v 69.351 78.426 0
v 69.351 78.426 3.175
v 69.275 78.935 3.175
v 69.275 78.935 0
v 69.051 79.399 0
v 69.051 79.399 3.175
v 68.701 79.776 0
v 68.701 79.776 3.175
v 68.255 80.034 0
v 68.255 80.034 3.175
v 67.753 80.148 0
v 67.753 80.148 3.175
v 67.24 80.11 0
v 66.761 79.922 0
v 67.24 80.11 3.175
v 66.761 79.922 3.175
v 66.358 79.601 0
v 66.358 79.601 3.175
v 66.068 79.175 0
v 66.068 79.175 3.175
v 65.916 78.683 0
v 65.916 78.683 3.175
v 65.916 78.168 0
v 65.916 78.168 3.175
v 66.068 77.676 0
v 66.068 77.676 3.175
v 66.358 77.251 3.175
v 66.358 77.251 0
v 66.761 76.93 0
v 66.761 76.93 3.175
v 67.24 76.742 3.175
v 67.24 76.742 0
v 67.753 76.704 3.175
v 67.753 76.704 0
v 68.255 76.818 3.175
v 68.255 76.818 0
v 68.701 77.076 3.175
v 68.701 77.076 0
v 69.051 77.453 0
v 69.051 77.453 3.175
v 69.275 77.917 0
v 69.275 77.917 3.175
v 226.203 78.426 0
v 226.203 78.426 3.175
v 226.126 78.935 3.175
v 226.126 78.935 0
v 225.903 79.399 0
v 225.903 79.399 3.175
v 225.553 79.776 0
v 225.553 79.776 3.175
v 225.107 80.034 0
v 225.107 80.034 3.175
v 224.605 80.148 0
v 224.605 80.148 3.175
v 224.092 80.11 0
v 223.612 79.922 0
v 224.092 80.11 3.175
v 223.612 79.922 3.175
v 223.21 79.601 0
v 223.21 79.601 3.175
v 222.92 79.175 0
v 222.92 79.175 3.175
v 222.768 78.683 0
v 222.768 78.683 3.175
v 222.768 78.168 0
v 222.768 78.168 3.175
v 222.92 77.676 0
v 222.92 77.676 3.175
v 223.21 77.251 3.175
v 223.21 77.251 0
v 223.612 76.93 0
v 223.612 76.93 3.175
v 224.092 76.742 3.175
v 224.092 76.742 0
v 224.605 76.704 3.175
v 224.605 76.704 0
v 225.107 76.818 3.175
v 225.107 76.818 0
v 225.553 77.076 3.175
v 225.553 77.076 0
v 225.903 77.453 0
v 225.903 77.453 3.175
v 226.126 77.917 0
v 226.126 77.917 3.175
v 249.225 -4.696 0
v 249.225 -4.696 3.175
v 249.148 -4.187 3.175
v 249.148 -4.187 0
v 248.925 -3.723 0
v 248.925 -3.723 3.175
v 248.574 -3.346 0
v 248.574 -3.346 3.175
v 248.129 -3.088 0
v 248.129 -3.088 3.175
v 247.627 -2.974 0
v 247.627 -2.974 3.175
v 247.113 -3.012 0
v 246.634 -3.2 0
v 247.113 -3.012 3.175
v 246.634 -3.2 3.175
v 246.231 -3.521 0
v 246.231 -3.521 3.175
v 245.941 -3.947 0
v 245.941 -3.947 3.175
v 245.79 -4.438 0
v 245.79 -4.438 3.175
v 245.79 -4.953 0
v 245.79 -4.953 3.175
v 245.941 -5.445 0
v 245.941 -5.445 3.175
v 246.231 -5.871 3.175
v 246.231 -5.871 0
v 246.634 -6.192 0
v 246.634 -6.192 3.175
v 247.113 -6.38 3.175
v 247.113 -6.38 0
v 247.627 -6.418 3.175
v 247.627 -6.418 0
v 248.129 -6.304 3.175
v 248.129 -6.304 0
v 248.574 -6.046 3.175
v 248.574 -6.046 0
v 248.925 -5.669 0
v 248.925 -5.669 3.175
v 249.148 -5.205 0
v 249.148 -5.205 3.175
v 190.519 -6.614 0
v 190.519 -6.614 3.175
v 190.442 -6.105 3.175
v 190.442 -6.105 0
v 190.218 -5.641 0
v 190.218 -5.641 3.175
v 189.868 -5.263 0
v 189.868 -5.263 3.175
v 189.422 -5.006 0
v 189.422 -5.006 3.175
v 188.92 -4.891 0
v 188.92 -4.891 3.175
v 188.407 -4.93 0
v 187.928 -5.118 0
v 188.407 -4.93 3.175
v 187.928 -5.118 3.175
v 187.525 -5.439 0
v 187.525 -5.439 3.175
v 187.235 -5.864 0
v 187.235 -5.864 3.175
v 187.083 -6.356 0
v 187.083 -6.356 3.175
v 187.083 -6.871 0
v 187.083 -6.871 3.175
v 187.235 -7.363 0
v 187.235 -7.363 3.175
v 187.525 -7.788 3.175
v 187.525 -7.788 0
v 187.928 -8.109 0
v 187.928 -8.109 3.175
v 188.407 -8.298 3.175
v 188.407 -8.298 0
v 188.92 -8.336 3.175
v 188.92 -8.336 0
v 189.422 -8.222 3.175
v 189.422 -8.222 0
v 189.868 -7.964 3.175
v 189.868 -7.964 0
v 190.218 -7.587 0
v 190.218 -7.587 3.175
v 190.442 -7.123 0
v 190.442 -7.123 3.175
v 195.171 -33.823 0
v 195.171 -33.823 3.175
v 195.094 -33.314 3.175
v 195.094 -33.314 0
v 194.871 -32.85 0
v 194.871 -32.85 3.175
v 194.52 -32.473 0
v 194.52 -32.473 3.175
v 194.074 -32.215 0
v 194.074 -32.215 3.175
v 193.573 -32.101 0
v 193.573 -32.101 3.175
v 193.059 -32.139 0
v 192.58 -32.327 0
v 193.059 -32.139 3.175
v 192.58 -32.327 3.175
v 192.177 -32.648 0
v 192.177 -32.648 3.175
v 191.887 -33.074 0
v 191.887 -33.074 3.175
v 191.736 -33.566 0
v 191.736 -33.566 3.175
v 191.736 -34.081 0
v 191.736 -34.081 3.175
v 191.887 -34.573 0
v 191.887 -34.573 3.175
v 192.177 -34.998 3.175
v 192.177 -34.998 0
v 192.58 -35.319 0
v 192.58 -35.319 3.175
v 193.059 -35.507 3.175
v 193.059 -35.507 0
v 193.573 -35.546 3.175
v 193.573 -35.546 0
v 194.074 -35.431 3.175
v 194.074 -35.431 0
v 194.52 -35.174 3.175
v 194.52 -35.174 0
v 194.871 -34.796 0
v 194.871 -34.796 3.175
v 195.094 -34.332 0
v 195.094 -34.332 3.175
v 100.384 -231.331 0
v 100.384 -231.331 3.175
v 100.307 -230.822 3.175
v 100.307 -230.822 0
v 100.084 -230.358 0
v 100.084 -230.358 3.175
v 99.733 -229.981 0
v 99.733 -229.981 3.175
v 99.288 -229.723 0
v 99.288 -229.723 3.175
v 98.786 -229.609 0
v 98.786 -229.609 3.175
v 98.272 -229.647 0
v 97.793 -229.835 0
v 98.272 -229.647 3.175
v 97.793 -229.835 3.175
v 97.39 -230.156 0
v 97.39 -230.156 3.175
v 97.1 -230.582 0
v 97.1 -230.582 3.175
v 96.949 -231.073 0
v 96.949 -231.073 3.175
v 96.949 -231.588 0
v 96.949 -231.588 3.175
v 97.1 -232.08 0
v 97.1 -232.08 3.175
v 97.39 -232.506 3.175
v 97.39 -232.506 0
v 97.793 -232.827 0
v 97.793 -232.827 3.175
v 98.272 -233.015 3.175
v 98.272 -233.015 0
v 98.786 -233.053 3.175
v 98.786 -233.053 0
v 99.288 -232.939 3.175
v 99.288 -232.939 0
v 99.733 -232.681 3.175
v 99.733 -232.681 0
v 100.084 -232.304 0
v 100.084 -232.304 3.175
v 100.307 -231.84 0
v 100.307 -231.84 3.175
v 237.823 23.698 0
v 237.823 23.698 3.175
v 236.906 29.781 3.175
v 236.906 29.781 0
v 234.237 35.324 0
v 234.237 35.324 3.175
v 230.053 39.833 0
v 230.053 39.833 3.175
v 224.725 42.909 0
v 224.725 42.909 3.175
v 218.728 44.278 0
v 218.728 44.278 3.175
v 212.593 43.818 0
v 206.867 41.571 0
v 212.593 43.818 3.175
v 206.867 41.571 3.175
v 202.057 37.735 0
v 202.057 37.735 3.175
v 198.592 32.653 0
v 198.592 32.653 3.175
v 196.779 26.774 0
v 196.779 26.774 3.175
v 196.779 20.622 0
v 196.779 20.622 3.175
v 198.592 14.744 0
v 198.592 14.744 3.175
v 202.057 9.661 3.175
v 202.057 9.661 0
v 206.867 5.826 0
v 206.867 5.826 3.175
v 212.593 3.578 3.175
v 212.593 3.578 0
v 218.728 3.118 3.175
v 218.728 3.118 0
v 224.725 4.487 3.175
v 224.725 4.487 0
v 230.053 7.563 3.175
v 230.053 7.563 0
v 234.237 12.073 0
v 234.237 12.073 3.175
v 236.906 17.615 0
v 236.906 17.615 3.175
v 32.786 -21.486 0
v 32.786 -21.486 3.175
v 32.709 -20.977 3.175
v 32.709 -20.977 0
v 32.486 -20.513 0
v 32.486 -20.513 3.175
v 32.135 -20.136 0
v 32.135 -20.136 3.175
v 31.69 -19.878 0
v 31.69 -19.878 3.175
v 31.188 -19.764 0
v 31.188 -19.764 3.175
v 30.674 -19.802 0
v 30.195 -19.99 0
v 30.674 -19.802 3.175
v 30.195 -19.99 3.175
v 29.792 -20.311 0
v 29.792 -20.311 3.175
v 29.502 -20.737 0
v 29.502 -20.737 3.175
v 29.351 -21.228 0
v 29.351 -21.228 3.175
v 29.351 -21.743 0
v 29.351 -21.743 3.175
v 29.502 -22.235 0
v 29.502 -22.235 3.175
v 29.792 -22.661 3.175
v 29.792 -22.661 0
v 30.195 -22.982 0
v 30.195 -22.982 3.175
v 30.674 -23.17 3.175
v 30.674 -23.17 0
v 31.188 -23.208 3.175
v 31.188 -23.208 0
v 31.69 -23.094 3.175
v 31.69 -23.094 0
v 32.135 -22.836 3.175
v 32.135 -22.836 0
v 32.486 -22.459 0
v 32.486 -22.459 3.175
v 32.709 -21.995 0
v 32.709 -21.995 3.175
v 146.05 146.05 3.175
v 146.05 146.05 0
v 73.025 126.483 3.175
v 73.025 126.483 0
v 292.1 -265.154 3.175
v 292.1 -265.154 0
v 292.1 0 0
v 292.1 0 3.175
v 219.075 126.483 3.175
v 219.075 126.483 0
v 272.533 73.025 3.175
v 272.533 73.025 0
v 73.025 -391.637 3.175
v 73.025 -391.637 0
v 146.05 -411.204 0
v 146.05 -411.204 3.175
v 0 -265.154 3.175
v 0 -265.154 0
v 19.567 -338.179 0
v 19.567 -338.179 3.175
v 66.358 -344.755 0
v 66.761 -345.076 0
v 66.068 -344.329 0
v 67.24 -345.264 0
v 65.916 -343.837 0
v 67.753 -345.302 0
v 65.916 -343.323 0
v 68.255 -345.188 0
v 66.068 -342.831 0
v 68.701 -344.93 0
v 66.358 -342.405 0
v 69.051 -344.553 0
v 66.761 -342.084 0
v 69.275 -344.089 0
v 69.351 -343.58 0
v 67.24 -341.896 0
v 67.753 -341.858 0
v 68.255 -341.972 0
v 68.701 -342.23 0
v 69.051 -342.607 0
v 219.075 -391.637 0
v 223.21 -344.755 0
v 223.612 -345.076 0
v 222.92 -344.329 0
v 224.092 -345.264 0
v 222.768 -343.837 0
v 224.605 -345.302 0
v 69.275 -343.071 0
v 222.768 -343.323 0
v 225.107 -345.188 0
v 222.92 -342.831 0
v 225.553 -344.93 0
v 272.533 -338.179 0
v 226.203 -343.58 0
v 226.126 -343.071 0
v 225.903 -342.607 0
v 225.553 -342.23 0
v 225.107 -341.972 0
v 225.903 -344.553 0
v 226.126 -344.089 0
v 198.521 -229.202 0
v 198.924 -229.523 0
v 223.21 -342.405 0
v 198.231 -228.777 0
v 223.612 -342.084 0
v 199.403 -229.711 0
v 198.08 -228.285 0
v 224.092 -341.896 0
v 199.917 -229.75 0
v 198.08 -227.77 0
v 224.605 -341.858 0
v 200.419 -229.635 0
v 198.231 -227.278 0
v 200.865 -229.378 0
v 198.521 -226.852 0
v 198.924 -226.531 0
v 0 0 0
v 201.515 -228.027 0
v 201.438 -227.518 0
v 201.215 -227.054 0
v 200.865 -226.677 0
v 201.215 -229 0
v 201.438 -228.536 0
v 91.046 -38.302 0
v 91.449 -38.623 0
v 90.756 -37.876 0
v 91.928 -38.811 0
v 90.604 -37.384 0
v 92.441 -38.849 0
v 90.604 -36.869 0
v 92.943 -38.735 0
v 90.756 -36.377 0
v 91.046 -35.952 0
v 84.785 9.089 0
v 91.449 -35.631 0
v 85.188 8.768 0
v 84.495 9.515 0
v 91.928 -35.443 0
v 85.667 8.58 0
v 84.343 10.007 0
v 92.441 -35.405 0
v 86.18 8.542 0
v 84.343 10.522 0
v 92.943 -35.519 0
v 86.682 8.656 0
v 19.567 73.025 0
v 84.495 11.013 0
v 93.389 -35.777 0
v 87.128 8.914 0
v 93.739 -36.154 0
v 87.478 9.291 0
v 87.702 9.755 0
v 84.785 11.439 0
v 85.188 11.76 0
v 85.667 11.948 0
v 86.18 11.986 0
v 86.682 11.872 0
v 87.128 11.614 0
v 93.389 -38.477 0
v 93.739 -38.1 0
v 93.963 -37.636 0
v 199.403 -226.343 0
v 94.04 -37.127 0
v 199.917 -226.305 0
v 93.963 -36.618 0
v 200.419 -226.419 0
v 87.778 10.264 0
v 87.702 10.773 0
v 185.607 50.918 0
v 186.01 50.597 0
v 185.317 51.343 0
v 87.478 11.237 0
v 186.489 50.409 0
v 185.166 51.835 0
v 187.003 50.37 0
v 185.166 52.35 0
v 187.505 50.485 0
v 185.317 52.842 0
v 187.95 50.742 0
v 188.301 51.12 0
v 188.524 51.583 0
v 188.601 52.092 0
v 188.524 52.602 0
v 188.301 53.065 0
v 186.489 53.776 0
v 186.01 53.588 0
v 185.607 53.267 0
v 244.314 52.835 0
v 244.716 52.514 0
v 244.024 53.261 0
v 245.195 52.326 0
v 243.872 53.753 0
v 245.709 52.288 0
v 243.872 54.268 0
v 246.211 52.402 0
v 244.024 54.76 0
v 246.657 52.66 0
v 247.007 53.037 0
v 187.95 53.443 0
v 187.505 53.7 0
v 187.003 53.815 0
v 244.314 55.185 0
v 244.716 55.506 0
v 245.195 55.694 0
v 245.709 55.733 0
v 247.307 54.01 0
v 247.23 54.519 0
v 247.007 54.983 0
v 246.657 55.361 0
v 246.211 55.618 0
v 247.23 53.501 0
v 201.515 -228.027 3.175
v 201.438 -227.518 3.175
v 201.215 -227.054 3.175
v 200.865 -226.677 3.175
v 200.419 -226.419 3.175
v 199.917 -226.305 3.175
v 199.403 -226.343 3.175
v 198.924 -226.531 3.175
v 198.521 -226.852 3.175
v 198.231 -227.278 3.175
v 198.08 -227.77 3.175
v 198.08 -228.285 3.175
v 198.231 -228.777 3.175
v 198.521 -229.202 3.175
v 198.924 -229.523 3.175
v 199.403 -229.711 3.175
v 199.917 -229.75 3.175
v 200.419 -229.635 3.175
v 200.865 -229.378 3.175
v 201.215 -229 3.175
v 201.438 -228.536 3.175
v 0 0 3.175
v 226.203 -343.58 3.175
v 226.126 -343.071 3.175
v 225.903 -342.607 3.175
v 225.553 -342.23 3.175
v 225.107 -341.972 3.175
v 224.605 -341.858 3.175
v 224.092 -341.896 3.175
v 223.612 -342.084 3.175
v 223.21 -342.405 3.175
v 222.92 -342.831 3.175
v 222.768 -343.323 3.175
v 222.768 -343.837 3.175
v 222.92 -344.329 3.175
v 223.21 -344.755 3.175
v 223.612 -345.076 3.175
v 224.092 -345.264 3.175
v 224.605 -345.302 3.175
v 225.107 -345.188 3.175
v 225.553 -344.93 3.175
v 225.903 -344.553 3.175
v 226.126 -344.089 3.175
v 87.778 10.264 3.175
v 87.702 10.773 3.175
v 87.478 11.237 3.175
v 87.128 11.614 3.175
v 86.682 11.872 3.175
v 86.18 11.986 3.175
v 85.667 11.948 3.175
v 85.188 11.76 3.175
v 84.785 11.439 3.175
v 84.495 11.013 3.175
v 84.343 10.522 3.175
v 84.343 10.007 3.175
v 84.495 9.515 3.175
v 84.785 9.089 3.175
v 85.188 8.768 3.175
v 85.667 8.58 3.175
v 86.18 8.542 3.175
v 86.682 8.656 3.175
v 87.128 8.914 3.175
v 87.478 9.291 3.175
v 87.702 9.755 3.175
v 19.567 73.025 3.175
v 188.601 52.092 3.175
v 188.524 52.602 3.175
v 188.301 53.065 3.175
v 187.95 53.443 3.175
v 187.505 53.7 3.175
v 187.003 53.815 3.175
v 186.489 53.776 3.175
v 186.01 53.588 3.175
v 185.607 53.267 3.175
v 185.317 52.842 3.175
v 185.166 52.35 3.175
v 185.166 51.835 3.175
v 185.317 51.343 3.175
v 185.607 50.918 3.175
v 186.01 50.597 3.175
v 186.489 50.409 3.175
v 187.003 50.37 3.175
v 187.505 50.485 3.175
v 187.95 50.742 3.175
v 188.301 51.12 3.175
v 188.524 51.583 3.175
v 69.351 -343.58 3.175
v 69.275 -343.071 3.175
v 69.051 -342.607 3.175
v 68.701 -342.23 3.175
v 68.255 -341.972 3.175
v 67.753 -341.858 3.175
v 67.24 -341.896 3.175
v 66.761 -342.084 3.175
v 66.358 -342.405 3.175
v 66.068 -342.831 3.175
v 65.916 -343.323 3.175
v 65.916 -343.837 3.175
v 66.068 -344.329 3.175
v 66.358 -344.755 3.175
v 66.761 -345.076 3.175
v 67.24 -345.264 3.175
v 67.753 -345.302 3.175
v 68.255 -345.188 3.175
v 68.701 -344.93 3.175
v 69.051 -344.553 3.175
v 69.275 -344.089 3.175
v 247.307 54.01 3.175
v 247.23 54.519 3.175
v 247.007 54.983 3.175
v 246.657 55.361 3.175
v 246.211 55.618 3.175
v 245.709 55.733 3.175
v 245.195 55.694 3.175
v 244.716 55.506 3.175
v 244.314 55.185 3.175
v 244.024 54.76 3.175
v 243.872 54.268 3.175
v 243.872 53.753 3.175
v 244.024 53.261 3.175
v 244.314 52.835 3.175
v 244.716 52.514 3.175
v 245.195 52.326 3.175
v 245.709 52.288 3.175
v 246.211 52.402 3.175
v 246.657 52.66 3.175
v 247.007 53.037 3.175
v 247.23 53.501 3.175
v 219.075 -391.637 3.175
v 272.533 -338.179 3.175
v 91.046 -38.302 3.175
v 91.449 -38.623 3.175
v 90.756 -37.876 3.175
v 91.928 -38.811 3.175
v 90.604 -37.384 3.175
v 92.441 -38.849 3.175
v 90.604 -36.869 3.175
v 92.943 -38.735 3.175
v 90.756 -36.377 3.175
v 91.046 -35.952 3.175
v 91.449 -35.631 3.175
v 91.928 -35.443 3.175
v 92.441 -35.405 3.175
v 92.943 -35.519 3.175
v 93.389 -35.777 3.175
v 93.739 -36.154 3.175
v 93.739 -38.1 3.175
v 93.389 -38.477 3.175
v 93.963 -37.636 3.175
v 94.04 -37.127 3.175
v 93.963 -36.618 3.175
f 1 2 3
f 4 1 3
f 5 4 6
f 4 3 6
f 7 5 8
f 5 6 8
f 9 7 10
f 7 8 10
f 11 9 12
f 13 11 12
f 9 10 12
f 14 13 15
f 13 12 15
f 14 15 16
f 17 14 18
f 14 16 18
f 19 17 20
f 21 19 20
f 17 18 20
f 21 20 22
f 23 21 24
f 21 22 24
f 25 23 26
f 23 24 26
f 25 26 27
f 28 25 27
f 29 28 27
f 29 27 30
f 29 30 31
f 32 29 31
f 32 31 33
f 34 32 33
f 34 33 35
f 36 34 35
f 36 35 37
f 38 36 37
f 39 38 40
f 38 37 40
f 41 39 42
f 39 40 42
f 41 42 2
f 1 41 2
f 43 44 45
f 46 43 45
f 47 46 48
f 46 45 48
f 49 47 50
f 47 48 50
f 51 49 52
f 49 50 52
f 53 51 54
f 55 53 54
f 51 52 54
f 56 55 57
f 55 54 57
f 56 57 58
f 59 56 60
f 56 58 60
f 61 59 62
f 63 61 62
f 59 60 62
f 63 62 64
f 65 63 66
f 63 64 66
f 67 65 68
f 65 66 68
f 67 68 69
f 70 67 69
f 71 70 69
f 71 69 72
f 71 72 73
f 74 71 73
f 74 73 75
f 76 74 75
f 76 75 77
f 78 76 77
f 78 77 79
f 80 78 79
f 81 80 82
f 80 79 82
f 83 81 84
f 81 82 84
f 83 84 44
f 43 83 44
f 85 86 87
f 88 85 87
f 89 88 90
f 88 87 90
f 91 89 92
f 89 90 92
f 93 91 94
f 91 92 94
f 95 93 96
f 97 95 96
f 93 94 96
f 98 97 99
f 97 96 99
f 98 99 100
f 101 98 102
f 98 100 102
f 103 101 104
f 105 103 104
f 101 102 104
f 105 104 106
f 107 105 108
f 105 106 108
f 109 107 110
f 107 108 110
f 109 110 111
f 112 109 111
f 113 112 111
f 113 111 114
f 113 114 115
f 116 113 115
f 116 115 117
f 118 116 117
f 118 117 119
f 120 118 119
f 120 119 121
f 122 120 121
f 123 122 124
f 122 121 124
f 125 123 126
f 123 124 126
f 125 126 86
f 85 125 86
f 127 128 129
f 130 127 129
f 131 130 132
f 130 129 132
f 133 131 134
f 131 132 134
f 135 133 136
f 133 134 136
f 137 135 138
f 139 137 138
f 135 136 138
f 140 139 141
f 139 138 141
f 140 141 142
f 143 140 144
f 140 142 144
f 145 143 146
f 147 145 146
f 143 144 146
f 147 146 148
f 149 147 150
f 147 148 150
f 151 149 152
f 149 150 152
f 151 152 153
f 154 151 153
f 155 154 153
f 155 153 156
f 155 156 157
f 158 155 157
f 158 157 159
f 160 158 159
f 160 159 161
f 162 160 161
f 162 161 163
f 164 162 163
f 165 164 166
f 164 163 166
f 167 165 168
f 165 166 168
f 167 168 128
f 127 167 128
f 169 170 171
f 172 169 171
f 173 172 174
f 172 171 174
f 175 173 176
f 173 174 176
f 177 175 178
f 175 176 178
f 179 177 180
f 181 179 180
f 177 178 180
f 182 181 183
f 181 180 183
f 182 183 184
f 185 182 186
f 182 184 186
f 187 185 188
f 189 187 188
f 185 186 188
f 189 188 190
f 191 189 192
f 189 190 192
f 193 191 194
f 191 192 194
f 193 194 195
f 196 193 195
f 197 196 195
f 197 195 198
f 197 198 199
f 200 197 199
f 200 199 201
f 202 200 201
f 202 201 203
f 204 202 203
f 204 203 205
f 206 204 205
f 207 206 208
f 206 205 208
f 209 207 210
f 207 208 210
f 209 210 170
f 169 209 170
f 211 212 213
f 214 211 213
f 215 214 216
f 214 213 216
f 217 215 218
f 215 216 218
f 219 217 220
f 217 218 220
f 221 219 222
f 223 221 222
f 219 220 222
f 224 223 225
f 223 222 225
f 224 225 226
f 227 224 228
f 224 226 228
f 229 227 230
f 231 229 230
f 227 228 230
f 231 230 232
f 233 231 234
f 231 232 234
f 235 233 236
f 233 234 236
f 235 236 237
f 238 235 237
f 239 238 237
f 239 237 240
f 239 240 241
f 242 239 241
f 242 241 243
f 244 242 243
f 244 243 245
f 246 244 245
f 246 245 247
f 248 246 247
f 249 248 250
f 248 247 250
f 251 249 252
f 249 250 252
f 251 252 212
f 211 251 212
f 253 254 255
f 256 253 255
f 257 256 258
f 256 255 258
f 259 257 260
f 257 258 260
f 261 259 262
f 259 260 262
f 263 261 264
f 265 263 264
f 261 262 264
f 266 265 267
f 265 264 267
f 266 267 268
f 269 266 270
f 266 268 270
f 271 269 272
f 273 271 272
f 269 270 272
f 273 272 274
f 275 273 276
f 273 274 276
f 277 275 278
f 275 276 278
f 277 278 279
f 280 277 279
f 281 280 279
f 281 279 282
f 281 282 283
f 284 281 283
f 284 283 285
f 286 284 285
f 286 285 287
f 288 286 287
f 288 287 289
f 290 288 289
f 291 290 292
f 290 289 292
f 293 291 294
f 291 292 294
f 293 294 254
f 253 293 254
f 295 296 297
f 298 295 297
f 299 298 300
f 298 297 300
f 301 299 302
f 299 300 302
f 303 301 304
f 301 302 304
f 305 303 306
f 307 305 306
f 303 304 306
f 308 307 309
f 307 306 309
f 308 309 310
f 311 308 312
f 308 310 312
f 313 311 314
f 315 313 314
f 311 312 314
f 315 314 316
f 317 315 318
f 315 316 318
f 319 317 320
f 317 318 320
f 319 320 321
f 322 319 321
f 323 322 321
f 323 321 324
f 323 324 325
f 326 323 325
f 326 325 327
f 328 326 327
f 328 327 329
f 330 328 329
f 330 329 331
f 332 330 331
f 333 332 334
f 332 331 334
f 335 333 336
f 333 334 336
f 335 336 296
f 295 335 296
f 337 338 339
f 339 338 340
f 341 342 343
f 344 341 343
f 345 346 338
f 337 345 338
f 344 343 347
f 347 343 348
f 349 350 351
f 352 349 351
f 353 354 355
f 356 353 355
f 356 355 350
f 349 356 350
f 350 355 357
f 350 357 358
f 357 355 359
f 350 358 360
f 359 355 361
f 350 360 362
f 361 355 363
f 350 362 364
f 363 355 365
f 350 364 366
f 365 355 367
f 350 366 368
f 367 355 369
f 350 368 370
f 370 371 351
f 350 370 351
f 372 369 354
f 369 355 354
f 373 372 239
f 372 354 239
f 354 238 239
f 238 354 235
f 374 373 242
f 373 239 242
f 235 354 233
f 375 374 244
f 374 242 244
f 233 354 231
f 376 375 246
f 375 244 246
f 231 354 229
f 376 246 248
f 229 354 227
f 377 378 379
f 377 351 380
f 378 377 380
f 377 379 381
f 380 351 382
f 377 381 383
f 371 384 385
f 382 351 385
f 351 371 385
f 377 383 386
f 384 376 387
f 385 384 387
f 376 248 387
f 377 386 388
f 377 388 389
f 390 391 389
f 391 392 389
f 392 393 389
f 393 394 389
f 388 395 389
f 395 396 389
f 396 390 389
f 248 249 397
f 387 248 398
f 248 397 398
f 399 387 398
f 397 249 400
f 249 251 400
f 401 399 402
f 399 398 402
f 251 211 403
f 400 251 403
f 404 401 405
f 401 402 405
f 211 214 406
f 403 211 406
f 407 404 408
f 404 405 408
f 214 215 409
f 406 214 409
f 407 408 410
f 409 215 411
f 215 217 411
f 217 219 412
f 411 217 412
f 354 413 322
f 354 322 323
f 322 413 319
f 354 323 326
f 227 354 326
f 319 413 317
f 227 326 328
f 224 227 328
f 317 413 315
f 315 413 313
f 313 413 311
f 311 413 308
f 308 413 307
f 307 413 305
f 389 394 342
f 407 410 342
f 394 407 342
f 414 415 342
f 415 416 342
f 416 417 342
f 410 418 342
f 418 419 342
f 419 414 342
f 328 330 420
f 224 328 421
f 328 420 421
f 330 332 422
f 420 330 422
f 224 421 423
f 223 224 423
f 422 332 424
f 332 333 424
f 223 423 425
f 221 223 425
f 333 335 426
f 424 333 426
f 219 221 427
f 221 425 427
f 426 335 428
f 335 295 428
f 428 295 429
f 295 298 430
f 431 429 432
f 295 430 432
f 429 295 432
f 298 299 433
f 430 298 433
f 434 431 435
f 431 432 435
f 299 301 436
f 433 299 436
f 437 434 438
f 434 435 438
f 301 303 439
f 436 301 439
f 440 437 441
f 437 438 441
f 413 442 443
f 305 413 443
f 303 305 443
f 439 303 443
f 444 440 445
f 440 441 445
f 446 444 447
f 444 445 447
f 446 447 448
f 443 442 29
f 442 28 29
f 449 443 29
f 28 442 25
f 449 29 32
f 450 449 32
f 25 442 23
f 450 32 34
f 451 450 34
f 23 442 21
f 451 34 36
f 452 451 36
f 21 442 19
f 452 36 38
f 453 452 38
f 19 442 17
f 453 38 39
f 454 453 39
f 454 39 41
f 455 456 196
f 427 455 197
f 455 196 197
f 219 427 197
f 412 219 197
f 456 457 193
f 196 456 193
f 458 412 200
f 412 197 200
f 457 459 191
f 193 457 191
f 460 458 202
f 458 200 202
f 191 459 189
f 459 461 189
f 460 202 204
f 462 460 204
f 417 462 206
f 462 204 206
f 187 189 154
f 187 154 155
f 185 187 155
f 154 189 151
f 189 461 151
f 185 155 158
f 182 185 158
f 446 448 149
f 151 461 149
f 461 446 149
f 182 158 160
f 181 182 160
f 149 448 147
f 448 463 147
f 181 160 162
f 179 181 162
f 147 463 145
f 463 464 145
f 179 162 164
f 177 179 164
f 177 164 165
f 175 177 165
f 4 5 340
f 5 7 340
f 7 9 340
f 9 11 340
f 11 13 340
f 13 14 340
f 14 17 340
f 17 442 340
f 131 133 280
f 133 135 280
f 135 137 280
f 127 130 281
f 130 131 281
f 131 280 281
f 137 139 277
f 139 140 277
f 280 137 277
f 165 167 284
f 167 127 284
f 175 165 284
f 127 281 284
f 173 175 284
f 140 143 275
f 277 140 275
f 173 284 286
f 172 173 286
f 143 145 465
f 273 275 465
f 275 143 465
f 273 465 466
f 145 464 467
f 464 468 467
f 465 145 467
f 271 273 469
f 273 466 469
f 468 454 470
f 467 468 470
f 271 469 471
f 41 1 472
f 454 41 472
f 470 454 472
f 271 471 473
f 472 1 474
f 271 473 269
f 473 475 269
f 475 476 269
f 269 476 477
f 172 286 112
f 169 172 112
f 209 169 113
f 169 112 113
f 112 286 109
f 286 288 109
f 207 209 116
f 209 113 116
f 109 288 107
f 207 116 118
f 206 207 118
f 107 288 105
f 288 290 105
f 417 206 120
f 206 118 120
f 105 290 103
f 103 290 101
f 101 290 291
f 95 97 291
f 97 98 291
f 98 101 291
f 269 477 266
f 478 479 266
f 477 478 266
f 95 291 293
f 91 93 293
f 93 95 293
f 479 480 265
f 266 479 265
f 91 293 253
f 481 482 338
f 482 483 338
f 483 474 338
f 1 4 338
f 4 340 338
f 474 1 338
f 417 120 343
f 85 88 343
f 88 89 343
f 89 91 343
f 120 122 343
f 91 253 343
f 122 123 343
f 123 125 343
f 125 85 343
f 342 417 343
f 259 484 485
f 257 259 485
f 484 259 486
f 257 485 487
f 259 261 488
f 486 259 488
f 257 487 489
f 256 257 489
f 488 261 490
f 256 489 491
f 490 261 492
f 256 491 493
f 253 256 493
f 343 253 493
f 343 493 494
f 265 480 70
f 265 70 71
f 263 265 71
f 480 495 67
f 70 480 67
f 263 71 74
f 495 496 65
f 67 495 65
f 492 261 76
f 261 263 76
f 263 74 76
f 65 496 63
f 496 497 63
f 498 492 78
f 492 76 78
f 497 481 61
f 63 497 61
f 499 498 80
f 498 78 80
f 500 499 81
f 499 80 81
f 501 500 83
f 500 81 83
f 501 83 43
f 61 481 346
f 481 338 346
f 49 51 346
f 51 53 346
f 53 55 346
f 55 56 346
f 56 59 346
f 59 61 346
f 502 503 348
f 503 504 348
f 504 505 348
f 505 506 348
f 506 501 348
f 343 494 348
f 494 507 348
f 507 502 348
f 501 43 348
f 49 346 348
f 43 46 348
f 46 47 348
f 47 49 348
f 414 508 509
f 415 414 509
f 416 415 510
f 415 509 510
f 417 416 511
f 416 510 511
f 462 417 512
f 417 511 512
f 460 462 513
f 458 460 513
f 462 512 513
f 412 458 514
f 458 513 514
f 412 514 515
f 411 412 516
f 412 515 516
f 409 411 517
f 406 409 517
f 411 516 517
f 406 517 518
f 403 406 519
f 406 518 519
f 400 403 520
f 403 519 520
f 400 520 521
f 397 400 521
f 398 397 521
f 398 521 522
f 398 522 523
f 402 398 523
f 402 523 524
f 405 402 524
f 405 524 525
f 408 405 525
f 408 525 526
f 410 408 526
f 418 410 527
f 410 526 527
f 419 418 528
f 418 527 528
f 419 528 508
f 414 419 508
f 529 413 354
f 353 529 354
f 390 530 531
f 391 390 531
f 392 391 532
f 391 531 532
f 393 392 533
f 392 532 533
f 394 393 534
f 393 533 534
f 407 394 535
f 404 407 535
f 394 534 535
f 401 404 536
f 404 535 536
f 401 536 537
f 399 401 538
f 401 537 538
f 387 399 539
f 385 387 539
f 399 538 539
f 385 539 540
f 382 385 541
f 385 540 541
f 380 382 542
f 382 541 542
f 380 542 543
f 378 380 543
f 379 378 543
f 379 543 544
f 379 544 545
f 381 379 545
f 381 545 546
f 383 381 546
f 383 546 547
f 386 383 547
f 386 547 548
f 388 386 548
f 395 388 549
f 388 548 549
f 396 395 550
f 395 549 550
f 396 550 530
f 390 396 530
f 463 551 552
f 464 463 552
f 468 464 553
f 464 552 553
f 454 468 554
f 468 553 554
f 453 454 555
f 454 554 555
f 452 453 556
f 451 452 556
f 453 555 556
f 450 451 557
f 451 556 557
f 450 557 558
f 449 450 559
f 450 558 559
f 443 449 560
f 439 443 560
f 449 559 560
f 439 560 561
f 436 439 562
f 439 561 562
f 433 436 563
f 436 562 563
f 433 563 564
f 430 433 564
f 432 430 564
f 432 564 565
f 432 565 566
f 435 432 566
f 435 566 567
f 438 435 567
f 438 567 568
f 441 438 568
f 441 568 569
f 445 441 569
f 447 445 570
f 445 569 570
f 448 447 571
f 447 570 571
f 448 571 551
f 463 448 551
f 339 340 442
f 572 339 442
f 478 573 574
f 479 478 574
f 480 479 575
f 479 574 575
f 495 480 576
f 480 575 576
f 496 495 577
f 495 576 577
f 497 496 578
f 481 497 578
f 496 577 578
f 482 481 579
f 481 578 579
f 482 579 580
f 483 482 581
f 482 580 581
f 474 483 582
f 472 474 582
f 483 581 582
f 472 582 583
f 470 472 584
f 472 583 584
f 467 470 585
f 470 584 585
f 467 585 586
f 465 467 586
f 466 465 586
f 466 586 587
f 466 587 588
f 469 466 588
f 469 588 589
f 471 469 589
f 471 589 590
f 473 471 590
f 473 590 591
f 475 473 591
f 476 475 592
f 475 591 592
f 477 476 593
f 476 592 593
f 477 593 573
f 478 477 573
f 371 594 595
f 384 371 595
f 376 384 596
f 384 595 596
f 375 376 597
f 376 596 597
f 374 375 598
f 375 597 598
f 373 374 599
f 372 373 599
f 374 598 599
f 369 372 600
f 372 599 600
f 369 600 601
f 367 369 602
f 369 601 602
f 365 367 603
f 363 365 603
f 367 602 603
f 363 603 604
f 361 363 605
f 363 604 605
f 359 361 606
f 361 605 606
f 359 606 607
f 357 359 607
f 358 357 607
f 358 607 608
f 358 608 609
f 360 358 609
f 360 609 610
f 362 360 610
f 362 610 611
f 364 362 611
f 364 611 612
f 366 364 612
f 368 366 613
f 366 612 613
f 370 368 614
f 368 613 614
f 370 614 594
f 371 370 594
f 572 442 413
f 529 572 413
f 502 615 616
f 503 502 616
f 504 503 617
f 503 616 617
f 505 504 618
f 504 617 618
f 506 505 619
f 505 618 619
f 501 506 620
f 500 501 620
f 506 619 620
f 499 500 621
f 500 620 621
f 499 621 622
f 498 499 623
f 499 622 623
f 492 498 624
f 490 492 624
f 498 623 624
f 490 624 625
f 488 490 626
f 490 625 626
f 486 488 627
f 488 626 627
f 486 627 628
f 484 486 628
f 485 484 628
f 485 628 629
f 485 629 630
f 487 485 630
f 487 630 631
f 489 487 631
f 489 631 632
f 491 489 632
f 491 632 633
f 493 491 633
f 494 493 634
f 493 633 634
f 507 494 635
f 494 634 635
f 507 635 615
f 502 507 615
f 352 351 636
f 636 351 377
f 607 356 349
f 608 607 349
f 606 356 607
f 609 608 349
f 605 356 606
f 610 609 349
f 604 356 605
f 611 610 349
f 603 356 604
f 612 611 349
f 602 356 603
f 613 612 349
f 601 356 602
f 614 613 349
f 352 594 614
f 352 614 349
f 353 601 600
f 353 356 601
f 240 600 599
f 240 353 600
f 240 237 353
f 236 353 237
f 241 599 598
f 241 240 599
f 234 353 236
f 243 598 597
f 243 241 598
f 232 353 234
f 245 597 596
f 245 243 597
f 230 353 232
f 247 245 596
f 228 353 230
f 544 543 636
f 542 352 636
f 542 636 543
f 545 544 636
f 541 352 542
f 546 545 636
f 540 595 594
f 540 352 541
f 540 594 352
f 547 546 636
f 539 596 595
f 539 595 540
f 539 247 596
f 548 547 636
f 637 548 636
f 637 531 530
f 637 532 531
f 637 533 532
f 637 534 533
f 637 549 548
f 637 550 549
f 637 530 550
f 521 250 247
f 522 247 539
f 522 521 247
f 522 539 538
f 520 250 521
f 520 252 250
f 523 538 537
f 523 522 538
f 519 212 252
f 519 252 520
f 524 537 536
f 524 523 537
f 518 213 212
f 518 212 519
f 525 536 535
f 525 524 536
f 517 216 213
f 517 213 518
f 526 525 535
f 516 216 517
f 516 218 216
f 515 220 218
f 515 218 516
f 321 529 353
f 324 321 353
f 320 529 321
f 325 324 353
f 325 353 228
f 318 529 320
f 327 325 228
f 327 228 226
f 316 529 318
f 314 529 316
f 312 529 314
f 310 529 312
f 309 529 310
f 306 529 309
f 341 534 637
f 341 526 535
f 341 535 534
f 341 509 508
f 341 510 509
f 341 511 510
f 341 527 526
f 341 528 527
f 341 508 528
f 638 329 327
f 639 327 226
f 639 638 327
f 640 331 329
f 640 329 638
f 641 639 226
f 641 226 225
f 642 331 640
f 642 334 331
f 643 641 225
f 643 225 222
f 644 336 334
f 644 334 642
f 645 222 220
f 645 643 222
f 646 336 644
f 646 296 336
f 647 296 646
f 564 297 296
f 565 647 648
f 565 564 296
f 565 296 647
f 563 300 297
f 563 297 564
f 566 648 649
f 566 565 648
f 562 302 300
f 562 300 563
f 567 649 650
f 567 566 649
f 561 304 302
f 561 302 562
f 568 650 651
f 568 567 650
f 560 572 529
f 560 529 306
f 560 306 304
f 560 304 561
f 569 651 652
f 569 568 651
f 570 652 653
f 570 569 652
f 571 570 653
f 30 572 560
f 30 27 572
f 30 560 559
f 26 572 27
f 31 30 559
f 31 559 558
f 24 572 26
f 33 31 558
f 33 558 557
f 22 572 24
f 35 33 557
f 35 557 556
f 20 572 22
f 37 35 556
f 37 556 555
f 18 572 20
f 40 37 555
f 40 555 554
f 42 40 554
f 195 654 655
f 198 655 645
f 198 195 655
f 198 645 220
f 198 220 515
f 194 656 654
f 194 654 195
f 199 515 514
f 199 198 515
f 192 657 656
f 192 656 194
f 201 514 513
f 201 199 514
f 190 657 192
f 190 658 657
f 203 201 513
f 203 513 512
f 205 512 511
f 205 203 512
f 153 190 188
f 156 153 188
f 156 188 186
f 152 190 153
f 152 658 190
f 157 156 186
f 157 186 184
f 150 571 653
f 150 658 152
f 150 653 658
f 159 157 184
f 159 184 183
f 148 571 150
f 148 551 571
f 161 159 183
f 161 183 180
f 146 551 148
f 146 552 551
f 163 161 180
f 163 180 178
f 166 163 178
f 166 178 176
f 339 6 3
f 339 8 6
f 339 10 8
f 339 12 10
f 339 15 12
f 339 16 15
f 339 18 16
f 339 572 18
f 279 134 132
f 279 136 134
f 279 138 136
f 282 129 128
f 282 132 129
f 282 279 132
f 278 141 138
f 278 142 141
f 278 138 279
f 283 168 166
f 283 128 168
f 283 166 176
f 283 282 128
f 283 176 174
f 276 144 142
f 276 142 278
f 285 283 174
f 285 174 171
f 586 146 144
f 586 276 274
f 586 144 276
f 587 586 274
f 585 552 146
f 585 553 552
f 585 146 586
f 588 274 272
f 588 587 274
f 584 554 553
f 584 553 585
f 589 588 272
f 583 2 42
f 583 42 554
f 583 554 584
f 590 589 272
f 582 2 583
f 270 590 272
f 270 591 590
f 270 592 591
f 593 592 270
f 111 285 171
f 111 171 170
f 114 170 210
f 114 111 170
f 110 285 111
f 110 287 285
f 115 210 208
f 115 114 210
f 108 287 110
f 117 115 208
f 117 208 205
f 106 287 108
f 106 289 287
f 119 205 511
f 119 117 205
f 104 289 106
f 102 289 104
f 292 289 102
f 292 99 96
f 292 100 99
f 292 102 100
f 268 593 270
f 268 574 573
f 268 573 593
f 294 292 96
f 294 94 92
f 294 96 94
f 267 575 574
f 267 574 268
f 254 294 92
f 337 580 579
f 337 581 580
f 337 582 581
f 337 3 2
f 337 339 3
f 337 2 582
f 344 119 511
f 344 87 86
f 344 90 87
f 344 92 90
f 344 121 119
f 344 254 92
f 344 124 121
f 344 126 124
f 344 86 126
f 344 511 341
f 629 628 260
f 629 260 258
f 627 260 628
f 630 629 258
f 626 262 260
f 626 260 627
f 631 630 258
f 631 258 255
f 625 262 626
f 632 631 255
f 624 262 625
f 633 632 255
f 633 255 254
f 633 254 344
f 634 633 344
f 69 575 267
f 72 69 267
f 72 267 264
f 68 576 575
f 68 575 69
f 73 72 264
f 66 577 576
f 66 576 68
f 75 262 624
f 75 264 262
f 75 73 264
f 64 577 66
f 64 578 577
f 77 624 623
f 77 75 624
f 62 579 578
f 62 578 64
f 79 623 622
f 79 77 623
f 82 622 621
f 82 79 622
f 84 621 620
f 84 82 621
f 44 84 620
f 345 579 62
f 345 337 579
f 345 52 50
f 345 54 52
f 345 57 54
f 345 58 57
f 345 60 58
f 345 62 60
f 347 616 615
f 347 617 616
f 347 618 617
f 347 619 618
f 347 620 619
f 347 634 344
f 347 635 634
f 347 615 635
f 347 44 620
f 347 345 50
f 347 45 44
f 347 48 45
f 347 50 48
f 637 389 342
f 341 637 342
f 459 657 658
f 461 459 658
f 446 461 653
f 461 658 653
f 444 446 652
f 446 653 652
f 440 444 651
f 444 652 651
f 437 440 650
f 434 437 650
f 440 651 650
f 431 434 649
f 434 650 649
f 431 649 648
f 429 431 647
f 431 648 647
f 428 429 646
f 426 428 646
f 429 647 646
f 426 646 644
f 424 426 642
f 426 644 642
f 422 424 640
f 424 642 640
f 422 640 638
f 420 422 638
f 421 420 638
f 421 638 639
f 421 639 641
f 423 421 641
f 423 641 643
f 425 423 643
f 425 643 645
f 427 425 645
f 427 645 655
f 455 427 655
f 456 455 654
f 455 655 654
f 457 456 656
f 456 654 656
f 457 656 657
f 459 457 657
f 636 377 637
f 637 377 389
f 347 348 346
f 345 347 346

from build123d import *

# Parameters (mm, degrees)
F1_DEPTH = 3.175
F2_R     = 20.6375
F2_R_2   = 1.7272
F3_DEPTH = 3.175


with BuildPart() as f1:
    # F0 (on Top) → F1 (new body)
    with BuildSketch(Plane.XY):
        Polygon((292.1, -265.154105), (292.1, 0), (272.53301, 73.025), (219.075, 126.48301), (146.05, 146.05), (73.025, 126.48301), (19.56699, 73.025), (0, 0), (0, -265.154105), (19.56699, -338.179105), (73.025, -391.637115), (146.05, -411.204105), (219.075, -391.637115), (272.53301, -338.179105), align=None)
    extrude(amount=F1_DEPTH)

    # F2 (on face) → F3 (cut, through all)
    with BuildSketch(Plane.XY.offset(3.175)):
        with Locations((217.185523, 23.698288)):
            Circle(F2_R)
        with Locations((92.312386, -37.126894)):
            Circle(F2_R_2)
        with Locations((193.443454, -33.823195)):
            Circle(F2_R_2)
        with Locations((188.791324, -6.613696)):
            Circle(F2_R_2)
        with Locations((247.497507, -4.695911)):
            Circle(F2_R_2)
        with Locations((245.579723, 54.010272)):
            Circle(F2_R_2)
        with Locations((186.873539, 52.092488)):
            Circle(F2_R_2)
        with Locations((199.787614, -228.027211)):
            Circle(F2_R_2)
        with Locations((98.656546, -231.330911)):
            Circle(F2_R_2)
        with Locations((224.475897, 78.425897)):
            Circle(F2_R_2)
        with Locations((67.624103, 78.425897)):
            Circle(F2_R_2)
        with Locations((67.624103, -343.580002)):
            Circle(F2_R_2)
        with Locations((224.475897, -343.580002)):
            Circle(F2_R_2)
        with Locations((31.05851, -21.485911)):
            Circle(F2_R_2)
        with Locations((86.051124, 10.264089)):
            Circle(F2_R_2)
    extrude(amount=-F3_DEPTH, mode=Mode.SUBTRACT)


solid = f1.part
